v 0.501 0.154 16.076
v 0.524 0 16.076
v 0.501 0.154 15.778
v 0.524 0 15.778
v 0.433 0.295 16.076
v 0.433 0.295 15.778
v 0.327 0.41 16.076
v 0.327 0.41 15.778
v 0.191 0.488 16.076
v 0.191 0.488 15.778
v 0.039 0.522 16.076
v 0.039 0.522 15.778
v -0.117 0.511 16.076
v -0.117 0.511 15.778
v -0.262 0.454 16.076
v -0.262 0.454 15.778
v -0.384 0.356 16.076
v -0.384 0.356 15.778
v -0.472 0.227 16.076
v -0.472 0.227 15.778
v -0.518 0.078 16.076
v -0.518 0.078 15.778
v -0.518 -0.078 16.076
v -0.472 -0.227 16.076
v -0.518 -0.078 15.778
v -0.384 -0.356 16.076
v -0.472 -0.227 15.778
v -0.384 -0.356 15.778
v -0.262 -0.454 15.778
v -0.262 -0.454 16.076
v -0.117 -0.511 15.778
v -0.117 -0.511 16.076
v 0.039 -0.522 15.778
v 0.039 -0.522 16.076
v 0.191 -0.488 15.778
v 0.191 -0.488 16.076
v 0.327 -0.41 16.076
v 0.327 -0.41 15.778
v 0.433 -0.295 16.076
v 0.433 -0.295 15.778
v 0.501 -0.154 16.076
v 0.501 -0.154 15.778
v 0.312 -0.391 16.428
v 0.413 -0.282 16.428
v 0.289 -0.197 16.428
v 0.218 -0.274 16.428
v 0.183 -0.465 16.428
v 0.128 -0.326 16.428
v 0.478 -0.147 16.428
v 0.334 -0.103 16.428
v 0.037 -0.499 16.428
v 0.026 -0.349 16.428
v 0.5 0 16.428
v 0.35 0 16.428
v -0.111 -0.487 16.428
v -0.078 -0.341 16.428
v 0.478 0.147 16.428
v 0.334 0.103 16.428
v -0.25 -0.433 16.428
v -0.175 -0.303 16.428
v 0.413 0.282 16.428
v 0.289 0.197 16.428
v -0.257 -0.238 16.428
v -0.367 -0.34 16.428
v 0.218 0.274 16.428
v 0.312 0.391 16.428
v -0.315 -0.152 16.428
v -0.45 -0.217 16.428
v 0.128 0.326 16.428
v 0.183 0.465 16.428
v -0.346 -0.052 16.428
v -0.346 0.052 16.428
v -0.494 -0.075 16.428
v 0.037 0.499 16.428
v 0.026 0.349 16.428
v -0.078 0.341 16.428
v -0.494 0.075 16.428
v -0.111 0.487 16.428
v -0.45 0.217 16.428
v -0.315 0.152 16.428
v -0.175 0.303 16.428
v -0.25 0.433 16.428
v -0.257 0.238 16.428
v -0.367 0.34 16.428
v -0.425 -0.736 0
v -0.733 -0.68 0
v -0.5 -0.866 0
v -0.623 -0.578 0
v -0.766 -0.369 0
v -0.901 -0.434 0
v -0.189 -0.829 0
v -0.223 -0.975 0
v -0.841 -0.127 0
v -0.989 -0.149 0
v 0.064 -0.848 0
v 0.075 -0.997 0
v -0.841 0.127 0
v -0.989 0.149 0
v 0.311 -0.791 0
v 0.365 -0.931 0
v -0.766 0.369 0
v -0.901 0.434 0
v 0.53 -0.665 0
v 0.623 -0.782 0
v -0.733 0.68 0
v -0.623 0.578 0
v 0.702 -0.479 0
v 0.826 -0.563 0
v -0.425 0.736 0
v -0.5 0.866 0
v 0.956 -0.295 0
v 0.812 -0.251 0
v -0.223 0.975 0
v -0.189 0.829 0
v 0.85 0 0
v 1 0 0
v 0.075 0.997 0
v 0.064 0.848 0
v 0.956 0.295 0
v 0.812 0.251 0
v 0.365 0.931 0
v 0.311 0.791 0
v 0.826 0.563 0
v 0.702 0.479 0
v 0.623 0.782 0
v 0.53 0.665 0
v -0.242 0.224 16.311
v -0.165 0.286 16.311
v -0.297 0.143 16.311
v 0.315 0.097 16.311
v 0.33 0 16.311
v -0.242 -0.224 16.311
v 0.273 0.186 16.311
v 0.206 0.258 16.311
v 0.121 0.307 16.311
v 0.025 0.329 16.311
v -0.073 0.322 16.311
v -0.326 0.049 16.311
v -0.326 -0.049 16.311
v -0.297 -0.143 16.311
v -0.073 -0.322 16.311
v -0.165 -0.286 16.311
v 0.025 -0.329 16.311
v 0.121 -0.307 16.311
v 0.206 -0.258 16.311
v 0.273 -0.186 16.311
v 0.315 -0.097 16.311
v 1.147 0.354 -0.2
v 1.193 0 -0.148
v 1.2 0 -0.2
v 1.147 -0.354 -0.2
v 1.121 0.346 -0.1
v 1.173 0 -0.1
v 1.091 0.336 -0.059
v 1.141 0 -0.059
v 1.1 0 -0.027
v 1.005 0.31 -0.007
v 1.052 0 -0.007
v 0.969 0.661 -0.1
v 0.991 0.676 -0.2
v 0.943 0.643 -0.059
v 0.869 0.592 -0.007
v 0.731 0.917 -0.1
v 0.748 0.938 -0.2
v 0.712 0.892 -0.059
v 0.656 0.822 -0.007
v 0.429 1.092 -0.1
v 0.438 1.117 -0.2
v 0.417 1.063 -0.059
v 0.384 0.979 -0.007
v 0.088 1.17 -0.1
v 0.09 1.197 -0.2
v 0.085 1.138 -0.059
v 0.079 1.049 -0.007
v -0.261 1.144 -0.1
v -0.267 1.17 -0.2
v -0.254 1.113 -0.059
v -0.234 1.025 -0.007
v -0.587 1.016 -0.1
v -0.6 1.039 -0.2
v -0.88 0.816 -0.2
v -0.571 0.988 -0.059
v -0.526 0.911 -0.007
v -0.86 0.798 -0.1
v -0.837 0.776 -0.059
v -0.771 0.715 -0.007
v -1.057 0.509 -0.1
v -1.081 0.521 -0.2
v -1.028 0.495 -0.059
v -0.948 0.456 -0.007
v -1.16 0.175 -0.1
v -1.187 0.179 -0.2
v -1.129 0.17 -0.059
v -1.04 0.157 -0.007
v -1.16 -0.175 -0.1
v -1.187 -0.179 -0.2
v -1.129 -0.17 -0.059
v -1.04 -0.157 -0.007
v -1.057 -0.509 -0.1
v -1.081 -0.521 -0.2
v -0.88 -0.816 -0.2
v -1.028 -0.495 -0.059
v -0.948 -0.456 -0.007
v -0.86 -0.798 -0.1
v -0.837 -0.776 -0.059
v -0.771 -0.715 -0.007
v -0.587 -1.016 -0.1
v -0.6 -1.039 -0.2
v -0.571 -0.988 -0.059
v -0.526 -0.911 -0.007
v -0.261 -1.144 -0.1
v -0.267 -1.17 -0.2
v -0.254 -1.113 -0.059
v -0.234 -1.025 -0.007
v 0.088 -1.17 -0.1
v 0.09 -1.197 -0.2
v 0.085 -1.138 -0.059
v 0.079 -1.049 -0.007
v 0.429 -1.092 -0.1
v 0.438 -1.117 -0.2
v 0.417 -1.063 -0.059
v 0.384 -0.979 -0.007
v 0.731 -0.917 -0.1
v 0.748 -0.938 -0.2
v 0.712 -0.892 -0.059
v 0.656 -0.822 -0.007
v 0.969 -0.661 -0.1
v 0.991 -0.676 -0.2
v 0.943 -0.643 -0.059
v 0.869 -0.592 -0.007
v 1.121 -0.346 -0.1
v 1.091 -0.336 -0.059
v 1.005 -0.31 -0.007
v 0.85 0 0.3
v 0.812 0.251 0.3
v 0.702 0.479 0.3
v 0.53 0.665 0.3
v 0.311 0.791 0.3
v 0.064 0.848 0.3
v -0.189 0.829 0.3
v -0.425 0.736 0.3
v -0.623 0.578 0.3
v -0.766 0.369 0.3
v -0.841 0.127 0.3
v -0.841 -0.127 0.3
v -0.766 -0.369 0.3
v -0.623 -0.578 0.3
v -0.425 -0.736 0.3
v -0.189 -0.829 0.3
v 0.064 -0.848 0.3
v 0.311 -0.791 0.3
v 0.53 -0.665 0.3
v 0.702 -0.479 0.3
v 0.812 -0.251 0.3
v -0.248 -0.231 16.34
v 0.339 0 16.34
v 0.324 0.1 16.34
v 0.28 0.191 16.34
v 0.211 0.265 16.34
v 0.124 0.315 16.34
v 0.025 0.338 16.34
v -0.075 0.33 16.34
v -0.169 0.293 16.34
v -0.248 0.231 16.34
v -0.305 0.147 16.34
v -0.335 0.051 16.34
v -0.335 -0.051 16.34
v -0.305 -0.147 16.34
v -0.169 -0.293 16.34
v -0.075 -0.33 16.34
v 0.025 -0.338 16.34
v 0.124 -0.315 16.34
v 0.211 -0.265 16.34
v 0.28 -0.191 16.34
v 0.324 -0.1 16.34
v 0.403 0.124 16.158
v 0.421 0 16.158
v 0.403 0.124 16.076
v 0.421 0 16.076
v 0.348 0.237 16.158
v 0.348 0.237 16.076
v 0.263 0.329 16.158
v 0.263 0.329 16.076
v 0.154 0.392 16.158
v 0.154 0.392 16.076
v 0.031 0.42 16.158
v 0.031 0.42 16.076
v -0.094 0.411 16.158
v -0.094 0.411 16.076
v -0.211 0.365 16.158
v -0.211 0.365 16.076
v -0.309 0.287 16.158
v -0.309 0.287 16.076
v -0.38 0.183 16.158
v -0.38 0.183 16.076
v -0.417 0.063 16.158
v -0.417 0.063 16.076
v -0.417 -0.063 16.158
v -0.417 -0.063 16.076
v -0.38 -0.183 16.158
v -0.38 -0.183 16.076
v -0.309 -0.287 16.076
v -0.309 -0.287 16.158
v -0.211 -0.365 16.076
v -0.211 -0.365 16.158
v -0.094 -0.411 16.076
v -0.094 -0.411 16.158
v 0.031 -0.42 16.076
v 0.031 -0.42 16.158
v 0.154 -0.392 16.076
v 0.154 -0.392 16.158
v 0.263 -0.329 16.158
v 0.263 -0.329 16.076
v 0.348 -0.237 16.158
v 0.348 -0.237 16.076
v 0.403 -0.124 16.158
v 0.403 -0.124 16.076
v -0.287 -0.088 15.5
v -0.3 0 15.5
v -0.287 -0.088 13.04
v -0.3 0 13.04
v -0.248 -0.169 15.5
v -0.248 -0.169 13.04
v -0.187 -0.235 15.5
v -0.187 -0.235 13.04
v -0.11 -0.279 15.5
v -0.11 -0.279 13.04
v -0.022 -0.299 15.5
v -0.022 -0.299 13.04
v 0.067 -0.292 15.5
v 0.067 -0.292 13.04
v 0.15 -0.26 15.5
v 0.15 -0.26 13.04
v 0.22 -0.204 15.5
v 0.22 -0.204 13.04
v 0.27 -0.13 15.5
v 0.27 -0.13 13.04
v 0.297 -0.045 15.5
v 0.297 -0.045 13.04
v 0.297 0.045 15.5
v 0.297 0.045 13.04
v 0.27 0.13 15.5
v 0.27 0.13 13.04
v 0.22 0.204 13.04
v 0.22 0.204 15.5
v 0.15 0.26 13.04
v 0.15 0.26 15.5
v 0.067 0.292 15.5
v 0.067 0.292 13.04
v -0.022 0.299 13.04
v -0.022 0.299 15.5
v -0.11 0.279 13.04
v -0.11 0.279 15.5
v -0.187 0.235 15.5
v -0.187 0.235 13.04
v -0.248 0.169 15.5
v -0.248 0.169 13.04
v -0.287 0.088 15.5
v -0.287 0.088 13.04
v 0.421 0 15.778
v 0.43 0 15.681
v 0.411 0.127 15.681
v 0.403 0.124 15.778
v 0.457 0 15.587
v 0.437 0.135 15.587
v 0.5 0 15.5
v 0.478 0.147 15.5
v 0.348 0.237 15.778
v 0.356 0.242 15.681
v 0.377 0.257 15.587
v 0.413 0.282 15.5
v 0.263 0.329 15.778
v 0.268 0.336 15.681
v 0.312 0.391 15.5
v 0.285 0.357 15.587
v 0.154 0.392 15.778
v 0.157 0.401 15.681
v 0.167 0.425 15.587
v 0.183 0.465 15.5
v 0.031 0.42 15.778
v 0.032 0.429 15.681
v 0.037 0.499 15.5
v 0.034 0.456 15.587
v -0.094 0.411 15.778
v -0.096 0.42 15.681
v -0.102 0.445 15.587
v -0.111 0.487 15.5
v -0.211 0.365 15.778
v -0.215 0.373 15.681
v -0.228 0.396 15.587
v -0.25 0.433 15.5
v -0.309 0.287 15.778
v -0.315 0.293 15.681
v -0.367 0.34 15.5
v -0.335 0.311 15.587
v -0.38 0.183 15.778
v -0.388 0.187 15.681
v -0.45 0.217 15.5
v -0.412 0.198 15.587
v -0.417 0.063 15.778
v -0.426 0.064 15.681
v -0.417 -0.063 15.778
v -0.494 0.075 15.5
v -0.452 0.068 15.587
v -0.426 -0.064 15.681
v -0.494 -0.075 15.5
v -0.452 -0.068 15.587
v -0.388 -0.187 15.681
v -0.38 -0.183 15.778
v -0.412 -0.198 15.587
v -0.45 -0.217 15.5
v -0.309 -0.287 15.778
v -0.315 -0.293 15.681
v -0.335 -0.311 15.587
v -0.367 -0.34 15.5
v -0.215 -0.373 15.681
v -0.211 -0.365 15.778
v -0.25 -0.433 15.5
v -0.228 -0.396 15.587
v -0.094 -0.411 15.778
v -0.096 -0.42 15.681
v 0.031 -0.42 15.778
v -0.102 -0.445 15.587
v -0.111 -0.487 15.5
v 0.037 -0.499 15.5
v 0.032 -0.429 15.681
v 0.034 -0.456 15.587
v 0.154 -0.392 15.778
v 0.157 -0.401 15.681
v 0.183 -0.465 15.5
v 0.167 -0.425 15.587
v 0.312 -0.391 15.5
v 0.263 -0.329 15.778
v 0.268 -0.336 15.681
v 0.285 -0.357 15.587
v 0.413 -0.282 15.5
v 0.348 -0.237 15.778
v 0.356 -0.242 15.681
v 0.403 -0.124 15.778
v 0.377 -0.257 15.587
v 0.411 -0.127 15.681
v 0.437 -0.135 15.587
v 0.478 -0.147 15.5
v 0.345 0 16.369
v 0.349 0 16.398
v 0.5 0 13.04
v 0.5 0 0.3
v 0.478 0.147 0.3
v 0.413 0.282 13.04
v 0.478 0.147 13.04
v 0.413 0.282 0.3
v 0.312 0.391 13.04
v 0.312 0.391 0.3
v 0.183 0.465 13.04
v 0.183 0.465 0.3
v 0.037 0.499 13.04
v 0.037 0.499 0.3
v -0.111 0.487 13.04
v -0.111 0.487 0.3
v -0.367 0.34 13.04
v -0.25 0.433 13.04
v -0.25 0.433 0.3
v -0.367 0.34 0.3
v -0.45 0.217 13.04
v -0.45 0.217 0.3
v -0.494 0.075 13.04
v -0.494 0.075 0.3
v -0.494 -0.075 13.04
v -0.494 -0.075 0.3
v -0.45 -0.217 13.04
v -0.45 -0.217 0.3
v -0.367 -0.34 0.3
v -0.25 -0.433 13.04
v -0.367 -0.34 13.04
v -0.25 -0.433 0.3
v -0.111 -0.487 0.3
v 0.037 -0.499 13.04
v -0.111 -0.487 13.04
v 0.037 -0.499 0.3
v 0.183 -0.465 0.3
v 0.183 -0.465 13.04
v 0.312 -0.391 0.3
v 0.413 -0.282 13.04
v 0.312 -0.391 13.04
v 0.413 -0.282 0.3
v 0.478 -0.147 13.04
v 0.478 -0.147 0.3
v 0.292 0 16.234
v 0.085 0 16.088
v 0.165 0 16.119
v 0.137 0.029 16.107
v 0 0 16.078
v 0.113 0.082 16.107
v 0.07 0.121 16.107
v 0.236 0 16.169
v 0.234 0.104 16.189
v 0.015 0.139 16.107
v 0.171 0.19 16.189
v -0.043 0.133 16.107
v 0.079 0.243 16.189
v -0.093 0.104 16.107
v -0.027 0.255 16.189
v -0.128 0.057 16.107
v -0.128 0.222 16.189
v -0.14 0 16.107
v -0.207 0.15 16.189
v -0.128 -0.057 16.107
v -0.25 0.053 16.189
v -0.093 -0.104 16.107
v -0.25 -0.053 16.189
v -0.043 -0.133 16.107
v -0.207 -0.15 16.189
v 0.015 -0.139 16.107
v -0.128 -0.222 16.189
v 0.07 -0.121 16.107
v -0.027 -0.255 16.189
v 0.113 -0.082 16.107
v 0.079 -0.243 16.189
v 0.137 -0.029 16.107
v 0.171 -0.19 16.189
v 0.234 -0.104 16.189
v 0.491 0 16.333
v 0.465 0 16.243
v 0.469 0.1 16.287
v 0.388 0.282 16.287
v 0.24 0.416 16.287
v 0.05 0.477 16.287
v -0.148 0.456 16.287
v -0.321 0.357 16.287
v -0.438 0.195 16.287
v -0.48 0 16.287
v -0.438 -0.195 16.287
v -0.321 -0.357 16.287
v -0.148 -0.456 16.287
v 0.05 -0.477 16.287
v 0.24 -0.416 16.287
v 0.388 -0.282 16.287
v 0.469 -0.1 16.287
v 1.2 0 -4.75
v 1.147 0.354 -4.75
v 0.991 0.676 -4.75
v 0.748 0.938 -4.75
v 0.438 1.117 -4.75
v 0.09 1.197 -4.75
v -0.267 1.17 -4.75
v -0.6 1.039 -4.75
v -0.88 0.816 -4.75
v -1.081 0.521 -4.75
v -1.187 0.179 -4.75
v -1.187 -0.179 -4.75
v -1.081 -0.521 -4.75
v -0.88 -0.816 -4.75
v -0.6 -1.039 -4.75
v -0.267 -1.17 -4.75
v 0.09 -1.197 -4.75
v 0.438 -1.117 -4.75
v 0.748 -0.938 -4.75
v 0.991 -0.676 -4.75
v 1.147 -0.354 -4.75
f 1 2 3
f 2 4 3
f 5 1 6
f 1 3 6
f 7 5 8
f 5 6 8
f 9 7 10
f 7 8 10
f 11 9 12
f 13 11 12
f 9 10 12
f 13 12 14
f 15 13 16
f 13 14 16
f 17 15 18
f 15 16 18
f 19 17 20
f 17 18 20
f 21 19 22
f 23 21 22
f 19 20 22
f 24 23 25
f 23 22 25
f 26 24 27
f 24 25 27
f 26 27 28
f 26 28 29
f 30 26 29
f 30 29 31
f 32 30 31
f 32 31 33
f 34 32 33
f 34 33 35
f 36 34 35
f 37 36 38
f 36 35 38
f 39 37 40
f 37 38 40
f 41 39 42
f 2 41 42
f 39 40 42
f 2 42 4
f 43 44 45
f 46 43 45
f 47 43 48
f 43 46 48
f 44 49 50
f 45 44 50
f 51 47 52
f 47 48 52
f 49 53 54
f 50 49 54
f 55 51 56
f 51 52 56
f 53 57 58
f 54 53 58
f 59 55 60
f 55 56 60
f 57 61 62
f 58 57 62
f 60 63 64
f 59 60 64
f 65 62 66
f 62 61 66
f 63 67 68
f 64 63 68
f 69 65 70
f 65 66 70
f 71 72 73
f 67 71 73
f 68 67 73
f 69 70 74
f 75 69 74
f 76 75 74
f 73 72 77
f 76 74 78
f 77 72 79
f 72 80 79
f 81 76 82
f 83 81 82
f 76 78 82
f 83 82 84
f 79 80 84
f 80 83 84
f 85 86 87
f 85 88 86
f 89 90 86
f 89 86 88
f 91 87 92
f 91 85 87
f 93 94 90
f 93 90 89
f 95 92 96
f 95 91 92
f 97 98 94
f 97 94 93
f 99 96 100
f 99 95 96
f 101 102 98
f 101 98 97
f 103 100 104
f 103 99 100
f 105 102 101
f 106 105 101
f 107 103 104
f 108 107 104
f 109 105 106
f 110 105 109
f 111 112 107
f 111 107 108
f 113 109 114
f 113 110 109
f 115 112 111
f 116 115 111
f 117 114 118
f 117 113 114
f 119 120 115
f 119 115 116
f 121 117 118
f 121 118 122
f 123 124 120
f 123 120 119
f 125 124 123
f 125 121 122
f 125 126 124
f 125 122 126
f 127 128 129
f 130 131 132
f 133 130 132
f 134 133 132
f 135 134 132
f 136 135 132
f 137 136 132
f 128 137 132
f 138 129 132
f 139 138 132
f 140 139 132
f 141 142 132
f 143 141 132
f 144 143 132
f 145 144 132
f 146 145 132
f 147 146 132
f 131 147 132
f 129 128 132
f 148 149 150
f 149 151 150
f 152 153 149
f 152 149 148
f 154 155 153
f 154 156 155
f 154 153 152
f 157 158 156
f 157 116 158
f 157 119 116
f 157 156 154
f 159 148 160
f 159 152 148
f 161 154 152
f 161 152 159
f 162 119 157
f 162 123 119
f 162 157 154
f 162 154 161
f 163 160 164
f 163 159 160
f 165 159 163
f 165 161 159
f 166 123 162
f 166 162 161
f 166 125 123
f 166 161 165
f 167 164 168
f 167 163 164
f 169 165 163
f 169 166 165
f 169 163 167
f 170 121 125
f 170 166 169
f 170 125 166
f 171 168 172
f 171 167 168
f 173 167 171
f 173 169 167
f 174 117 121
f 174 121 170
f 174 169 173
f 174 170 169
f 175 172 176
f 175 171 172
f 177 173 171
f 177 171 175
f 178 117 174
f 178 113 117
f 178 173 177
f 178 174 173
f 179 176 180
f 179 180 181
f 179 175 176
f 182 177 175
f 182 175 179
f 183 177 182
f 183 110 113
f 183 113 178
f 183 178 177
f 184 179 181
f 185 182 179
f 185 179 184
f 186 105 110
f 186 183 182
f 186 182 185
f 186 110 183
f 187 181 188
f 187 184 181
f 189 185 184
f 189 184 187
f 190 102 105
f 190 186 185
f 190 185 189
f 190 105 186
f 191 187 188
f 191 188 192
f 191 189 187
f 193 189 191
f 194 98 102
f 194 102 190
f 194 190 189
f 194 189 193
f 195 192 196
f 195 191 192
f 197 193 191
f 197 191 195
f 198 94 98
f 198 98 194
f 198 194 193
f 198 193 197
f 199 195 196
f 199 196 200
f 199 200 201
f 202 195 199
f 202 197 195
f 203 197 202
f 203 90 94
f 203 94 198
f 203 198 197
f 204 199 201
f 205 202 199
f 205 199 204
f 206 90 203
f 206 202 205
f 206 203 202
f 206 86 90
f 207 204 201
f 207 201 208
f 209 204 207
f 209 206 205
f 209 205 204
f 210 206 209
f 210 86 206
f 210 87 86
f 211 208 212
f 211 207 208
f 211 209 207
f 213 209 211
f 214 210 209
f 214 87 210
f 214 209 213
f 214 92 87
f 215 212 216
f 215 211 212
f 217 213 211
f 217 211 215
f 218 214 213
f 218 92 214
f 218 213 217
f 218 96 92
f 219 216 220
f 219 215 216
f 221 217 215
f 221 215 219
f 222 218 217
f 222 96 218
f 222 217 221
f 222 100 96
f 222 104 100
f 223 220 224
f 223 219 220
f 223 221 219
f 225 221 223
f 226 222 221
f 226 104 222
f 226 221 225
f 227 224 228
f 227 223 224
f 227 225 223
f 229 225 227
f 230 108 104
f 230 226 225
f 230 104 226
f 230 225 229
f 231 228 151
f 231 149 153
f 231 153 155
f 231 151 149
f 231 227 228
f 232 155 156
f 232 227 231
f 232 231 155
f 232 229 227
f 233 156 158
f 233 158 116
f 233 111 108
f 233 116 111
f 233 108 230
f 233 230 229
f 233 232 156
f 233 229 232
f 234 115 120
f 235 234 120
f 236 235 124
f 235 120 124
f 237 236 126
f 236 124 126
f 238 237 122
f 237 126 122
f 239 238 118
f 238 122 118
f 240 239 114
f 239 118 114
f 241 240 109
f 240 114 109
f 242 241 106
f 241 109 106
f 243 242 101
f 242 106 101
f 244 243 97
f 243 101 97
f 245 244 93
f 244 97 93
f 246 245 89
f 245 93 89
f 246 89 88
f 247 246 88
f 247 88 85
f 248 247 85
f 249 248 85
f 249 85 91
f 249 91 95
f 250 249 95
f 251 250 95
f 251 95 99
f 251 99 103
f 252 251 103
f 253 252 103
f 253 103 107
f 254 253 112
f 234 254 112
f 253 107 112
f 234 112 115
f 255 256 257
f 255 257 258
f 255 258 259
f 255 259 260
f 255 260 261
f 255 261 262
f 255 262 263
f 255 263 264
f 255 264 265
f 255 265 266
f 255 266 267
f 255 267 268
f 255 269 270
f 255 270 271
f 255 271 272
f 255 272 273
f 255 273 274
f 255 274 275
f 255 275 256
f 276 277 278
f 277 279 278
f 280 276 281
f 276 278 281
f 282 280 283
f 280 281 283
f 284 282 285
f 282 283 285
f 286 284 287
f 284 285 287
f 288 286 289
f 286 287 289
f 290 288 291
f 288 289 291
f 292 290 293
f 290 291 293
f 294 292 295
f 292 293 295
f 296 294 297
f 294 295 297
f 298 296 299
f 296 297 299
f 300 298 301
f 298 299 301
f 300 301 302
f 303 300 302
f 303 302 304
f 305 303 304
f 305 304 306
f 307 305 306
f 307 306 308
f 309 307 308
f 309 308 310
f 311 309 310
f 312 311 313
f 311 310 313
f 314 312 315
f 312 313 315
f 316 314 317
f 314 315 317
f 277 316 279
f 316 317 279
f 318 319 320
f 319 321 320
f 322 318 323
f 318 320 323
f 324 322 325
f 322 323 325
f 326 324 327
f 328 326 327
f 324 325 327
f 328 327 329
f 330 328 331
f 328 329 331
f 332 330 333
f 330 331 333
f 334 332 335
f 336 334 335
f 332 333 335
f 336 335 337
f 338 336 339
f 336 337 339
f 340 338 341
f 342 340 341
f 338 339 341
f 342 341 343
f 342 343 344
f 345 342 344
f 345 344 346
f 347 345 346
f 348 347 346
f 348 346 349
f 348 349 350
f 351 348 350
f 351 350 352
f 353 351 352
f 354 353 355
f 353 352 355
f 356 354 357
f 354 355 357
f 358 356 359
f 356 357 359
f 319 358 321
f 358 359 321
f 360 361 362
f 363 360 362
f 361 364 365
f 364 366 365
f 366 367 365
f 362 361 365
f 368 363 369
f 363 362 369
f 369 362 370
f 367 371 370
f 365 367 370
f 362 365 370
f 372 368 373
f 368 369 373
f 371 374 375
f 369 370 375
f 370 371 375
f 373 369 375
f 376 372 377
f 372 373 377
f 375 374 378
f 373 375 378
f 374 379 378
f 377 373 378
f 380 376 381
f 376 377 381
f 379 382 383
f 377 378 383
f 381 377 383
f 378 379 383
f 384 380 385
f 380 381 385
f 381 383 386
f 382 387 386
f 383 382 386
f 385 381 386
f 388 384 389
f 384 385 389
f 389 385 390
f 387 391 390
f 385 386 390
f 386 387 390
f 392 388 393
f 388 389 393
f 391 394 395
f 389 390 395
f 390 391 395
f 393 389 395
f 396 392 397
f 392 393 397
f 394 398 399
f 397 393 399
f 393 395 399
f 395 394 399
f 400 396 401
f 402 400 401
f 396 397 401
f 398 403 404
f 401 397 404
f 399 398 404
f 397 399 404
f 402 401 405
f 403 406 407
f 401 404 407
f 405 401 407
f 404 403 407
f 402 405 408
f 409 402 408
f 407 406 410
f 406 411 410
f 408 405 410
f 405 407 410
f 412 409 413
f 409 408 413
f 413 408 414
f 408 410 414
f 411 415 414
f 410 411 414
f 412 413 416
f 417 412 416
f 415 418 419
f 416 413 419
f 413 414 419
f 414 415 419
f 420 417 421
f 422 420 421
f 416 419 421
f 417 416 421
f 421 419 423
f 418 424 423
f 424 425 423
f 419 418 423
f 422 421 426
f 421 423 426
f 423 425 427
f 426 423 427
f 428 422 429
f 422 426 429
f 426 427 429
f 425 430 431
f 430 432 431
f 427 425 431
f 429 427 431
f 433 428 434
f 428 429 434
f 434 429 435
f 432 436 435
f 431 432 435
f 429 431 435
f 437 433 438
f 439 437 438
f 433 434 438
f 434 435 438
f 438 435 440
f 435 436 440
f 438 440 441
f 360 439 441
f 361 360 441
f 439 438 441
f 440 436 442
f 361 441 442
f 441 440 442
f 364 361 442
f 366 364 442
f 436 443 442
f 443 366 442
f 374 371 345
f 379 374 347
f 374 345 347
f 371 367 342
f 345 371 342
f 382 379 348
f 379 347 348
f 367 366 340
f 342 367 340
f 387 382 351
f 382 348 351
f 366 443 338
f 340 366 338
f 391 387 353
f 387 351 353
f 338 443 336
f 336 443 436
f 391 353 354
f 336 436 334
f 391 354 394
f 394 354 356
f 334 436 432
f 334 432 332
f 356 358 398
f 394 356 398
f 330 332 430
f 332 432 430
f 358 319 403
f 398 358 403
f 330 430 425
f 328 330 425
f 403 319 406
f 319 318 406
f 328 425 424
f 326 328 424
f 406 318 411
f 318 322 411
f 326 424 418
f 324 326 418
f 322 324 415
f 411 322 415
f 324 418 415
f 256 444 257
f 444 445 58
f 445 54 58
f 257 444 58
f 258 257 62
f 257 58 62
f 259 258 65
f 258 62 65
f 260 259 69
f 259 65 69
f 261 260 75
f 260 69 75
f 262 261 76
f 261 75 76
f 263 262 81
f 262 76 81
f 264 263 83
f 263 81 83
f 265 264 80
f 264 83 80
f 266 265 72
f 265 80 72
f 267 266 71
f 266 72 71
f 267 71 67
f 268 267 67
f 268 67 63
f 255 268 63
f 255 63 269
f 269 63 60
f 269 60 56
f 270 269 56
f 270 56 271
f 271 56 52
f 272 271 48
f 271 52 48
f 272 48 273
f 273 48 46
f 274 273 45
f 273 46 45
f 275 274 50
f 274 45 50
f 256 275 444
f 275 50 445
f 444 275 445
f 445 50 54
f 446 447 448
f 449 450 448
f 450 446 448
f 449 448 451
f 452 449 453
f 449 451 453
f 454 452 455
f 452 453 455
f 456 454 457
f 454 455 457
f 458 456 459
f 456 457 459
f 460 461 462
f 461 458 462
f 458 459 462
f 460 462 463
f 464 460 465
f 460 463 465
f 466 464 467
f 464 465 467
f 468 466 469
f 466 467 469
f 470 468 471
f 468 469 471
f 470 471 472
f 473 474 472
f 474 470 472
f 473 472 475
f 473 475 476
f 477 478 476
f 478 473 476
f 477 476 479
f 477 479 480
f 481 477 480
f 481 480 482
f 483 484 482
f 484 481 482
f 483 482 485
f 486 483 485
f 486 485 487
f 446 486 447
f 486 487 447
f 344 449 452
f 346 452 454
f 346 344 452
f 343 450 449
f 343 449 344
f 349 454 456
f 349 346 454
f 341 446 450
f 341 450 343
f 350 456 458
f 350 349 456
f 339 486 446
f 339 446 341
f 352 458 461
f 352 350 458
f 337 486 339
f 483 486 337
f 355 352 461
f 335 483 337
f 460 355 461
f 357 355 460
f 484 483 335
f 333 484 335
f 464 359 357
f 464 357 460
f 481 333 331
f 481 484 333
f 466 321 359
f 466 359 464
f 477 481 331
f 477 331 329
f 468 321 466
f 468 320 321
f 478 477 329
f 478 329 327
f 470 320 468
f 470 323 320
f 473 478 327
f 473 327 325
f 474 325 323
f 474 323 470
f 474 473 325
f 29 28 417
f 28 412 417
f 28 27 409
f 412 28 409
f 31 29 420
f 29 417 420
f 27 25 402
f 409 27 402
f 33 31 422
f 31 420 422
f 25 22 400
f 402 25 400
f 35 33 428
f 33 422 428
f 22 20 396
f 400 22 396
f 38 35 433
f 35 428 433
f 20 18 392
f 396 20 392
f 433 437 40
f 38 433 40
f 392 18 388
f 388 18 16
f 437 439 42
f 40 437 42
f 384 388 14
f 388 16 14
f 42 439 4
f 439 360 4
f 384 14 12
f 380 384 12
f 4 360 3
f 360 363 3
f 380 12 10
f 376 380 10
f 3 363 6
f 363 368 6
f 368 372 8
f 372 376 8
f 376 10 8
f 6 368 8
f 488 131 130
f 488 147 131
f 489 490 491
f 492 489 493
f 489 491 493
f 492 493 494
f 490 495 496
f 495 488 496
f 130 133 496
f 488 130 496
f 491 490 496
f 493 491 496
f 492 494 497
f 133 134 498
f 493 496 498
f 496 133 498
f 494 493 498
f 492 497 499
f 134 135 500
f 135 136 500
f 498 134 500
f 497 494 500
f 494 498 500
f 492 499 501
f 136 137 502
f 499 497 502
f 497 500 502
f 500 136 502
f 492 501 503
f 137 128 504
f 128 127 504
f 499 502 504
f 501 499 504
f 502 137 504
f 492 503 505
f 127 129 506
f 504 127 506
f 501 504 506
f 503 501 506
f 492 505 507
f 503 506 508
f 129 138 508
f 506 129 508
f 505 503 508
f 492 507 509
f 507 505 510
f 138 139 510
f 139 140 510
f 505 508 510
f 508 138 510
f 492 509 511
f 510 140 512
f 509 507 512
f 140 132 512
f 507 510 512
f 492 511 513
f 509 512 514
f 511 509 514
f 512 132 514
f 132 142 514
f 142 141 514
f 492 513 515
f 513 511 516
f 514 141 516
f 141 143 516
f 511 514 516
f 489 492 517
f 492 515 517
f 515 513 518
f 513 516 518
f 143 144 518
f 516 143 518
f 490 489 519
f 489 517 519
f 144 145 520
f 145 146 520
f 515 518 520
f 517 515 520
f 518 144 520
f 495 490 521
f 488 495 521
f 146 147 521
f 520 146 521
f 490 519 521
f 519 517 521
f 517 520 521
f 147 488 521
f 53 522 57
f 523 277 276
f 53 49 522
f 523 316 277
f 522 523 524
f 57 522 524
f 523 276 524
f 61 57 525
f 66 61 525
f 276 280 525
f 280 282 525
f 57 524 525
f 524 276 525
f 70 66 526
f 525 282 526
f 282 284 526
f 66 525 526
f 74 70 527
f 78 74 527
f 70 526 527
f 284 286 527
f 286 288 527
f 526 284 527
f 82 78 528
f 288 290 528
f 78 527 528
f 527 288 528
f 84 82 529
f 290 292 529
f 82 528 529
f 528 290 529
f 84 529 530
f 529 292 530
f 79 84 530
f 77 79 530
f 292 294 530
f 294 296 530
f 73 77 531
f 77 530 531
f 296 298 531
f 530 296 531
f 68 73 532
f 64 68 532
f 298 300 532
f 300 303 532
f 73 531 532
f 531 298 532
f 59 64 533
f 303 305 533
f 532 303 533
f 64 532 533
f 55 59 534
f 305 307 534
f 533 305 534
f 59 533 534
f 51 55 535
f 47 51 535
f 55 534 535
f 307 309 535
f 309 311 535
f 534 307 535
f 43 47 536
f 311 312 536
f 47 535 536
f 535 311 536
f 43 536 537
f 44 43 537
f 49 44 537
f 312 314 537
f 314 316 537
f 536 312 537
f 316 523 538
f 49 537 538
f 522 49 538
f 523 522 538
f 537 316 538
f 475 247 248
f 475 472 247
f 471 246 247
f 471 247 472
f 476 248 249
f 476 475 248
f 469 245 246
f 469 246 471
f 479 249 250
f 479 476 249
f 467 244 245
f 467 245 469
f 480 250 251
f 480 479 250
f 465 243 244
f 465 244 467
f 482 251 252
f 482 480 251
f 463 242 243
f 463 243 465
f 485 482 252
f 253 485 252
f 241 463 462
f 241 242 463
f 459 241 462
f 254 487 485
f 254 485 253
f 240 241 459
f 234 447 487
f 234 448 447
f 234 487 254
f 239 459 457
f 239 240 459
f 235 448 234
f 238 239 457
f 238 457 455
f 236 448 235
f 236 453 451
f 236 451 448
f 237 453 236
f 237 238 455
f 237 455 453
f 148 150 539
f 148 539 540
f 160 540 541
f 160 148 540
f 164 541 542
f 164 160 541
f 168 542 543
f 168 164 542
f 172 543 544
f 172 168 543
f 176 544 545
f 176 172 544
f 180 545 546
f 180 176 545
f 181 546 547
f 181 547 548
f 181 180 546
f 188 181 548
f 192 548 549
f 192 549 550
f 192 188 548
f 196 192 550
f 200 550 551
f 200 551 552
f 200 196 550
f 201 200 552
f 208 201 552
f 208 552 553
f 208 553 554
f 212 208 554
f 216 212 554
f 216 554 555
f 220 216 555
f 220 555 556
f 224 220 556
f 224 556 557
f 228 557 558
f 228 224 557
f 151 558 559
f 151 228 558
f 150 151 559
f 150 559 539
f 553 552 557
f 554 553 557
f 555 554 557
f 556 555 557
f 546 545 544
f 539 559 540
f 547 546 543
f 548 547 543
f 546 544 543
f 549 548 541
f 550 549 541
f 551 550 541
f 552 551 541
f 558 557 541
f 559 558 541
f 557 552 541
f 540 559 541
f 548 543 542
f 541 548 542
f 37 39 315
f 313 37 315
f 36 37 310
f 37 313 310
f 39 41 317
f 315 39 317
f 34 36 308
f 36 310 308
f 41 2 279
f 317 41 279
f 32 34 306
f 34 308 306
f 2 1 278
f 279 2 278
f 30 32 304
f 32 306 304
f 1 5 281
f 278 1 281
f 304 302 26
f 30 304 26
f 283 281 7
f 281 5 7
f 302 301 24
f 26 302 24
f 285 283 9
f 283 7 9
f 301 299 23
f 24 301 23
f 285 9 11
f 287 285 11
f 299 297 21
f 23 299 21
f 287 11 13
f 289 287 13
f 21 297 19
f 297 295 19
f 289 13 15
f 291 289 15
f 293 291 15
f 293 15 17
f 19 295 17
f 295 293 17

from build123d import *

# Parameters (mm, degrees)
SKETCH2_R           = 0.5
BOSS_EXTRUDE1_DEPTH = 15.5
SKETCH2_3_R         = 1.2
BOSS_EXTRUDE2_DEPTH = 4.75
FILLET1_R           = 0.2
SKETCH3_R           = 0.85
BOSS_EXTRUDE3_DEPTH = 0.3
SKETCH5_W           = 0.452483434
SKETCH5_H           = 0.029273323
SKETCH6_W           = 1.07619714
SKETCH6_H           = 2.46


with BuildPart() as part:
    # Sketch2 → Boss-Extrude1 (new body)
    with BuildSketch(Plane.XY):
        Circle(SKETCH2_R)
    extrude(amount=BOSS_EXTRUDE1_DEPTH)

    # Sketch2<3> → Boss-Extrude2 (add)
    with BuildSketch(Plane.XY):
        Circle(SKETCH2_3_R)
    extrude(amount=-BOSS_EXTRUDE2_DEPTH)

    # Fillet1
    fillet1_edges = [part.edges().sort_by_distance(p)[0] for p in [
        (-1.2, 0, 0),
    ]]
    fillet(fillet1_edges, radius=FILLET1_R)

    # Sketch3 → Boss-Extrude3 (add)
    with BuildSketch(Plane.XY):
        Circle(SKETCH3_R)
    extrude(amount=BOSS_EXTRUDE3_DEPTH)

    # Sketch4 → Revolve1 (revolve)
    with BuildSketch(Plane(origin=(0, 0, 0), x_dir=(1, 0, 0), z_dir=(0, 1, 0))):
        with BuildLine():
            Line((0.5, -15.5), (0, -15.5))
            Line((0, -15.5), (0, -16.0775))
            ThreePointArc((0, -16.0775), (0.247487373, -16.180012627), (0.35, -16.4275))
            Line((0.35, -16.4275), (0.5, -16.4275))
            ThreePointArc((0.5, -16.4275), (0.479947408, -16.287319809), (0.421398056, -16.158383523))
            Line((0.421398056, -16.158383523), (0.421398056, -16.076439057))
            Line((0.421398056, -16.076439057), (0.523845222, -16.076439057))
            Line((0.523845222, -16.076439057), (0.523845222, -15.778410938))
            Line((0.523845222, -15.778410938), (0.421398056, -15.778410938))
            ThreePointArc((0.421398056, -15.778410938), (0.441425242, -15.633764027), (0.5, -15.5))
        make_face()
    revolve(axis=Axis((0, 0, 15.5), (0, 0, 1)))

    # Sketch5 → Revolve2 (revolve)
    with BuildSketch(Plane(origin=(0, 0, 0), x_dir=(1, 0, 0), z_dir=(0, 1, 0))):
        with Locations((-0.226241717, -16.325363339)):
            Rectangle(SKETCH5_W, SKETCH5_H)
    revolve(axis=Axis((0, 0, 15.5), (0, 0, 1)))

    # Sketch6 → Cut-Revolve1 (revolve, cut)
    with BuildSketch(Plane(origin=(0, 0, 0), x_dir=(1, 0, 0), z_dir=(0, 1, 0))):
        with Locations((-0.83809857, -14.27)):
            Rectangle(SKETCH6_W, SKETCH6_H)
    revolve(axis=Axis((0, 0, 15.5), (0, 0, 1)), mode=Mode.SUBTRACT)


solid = part.part
